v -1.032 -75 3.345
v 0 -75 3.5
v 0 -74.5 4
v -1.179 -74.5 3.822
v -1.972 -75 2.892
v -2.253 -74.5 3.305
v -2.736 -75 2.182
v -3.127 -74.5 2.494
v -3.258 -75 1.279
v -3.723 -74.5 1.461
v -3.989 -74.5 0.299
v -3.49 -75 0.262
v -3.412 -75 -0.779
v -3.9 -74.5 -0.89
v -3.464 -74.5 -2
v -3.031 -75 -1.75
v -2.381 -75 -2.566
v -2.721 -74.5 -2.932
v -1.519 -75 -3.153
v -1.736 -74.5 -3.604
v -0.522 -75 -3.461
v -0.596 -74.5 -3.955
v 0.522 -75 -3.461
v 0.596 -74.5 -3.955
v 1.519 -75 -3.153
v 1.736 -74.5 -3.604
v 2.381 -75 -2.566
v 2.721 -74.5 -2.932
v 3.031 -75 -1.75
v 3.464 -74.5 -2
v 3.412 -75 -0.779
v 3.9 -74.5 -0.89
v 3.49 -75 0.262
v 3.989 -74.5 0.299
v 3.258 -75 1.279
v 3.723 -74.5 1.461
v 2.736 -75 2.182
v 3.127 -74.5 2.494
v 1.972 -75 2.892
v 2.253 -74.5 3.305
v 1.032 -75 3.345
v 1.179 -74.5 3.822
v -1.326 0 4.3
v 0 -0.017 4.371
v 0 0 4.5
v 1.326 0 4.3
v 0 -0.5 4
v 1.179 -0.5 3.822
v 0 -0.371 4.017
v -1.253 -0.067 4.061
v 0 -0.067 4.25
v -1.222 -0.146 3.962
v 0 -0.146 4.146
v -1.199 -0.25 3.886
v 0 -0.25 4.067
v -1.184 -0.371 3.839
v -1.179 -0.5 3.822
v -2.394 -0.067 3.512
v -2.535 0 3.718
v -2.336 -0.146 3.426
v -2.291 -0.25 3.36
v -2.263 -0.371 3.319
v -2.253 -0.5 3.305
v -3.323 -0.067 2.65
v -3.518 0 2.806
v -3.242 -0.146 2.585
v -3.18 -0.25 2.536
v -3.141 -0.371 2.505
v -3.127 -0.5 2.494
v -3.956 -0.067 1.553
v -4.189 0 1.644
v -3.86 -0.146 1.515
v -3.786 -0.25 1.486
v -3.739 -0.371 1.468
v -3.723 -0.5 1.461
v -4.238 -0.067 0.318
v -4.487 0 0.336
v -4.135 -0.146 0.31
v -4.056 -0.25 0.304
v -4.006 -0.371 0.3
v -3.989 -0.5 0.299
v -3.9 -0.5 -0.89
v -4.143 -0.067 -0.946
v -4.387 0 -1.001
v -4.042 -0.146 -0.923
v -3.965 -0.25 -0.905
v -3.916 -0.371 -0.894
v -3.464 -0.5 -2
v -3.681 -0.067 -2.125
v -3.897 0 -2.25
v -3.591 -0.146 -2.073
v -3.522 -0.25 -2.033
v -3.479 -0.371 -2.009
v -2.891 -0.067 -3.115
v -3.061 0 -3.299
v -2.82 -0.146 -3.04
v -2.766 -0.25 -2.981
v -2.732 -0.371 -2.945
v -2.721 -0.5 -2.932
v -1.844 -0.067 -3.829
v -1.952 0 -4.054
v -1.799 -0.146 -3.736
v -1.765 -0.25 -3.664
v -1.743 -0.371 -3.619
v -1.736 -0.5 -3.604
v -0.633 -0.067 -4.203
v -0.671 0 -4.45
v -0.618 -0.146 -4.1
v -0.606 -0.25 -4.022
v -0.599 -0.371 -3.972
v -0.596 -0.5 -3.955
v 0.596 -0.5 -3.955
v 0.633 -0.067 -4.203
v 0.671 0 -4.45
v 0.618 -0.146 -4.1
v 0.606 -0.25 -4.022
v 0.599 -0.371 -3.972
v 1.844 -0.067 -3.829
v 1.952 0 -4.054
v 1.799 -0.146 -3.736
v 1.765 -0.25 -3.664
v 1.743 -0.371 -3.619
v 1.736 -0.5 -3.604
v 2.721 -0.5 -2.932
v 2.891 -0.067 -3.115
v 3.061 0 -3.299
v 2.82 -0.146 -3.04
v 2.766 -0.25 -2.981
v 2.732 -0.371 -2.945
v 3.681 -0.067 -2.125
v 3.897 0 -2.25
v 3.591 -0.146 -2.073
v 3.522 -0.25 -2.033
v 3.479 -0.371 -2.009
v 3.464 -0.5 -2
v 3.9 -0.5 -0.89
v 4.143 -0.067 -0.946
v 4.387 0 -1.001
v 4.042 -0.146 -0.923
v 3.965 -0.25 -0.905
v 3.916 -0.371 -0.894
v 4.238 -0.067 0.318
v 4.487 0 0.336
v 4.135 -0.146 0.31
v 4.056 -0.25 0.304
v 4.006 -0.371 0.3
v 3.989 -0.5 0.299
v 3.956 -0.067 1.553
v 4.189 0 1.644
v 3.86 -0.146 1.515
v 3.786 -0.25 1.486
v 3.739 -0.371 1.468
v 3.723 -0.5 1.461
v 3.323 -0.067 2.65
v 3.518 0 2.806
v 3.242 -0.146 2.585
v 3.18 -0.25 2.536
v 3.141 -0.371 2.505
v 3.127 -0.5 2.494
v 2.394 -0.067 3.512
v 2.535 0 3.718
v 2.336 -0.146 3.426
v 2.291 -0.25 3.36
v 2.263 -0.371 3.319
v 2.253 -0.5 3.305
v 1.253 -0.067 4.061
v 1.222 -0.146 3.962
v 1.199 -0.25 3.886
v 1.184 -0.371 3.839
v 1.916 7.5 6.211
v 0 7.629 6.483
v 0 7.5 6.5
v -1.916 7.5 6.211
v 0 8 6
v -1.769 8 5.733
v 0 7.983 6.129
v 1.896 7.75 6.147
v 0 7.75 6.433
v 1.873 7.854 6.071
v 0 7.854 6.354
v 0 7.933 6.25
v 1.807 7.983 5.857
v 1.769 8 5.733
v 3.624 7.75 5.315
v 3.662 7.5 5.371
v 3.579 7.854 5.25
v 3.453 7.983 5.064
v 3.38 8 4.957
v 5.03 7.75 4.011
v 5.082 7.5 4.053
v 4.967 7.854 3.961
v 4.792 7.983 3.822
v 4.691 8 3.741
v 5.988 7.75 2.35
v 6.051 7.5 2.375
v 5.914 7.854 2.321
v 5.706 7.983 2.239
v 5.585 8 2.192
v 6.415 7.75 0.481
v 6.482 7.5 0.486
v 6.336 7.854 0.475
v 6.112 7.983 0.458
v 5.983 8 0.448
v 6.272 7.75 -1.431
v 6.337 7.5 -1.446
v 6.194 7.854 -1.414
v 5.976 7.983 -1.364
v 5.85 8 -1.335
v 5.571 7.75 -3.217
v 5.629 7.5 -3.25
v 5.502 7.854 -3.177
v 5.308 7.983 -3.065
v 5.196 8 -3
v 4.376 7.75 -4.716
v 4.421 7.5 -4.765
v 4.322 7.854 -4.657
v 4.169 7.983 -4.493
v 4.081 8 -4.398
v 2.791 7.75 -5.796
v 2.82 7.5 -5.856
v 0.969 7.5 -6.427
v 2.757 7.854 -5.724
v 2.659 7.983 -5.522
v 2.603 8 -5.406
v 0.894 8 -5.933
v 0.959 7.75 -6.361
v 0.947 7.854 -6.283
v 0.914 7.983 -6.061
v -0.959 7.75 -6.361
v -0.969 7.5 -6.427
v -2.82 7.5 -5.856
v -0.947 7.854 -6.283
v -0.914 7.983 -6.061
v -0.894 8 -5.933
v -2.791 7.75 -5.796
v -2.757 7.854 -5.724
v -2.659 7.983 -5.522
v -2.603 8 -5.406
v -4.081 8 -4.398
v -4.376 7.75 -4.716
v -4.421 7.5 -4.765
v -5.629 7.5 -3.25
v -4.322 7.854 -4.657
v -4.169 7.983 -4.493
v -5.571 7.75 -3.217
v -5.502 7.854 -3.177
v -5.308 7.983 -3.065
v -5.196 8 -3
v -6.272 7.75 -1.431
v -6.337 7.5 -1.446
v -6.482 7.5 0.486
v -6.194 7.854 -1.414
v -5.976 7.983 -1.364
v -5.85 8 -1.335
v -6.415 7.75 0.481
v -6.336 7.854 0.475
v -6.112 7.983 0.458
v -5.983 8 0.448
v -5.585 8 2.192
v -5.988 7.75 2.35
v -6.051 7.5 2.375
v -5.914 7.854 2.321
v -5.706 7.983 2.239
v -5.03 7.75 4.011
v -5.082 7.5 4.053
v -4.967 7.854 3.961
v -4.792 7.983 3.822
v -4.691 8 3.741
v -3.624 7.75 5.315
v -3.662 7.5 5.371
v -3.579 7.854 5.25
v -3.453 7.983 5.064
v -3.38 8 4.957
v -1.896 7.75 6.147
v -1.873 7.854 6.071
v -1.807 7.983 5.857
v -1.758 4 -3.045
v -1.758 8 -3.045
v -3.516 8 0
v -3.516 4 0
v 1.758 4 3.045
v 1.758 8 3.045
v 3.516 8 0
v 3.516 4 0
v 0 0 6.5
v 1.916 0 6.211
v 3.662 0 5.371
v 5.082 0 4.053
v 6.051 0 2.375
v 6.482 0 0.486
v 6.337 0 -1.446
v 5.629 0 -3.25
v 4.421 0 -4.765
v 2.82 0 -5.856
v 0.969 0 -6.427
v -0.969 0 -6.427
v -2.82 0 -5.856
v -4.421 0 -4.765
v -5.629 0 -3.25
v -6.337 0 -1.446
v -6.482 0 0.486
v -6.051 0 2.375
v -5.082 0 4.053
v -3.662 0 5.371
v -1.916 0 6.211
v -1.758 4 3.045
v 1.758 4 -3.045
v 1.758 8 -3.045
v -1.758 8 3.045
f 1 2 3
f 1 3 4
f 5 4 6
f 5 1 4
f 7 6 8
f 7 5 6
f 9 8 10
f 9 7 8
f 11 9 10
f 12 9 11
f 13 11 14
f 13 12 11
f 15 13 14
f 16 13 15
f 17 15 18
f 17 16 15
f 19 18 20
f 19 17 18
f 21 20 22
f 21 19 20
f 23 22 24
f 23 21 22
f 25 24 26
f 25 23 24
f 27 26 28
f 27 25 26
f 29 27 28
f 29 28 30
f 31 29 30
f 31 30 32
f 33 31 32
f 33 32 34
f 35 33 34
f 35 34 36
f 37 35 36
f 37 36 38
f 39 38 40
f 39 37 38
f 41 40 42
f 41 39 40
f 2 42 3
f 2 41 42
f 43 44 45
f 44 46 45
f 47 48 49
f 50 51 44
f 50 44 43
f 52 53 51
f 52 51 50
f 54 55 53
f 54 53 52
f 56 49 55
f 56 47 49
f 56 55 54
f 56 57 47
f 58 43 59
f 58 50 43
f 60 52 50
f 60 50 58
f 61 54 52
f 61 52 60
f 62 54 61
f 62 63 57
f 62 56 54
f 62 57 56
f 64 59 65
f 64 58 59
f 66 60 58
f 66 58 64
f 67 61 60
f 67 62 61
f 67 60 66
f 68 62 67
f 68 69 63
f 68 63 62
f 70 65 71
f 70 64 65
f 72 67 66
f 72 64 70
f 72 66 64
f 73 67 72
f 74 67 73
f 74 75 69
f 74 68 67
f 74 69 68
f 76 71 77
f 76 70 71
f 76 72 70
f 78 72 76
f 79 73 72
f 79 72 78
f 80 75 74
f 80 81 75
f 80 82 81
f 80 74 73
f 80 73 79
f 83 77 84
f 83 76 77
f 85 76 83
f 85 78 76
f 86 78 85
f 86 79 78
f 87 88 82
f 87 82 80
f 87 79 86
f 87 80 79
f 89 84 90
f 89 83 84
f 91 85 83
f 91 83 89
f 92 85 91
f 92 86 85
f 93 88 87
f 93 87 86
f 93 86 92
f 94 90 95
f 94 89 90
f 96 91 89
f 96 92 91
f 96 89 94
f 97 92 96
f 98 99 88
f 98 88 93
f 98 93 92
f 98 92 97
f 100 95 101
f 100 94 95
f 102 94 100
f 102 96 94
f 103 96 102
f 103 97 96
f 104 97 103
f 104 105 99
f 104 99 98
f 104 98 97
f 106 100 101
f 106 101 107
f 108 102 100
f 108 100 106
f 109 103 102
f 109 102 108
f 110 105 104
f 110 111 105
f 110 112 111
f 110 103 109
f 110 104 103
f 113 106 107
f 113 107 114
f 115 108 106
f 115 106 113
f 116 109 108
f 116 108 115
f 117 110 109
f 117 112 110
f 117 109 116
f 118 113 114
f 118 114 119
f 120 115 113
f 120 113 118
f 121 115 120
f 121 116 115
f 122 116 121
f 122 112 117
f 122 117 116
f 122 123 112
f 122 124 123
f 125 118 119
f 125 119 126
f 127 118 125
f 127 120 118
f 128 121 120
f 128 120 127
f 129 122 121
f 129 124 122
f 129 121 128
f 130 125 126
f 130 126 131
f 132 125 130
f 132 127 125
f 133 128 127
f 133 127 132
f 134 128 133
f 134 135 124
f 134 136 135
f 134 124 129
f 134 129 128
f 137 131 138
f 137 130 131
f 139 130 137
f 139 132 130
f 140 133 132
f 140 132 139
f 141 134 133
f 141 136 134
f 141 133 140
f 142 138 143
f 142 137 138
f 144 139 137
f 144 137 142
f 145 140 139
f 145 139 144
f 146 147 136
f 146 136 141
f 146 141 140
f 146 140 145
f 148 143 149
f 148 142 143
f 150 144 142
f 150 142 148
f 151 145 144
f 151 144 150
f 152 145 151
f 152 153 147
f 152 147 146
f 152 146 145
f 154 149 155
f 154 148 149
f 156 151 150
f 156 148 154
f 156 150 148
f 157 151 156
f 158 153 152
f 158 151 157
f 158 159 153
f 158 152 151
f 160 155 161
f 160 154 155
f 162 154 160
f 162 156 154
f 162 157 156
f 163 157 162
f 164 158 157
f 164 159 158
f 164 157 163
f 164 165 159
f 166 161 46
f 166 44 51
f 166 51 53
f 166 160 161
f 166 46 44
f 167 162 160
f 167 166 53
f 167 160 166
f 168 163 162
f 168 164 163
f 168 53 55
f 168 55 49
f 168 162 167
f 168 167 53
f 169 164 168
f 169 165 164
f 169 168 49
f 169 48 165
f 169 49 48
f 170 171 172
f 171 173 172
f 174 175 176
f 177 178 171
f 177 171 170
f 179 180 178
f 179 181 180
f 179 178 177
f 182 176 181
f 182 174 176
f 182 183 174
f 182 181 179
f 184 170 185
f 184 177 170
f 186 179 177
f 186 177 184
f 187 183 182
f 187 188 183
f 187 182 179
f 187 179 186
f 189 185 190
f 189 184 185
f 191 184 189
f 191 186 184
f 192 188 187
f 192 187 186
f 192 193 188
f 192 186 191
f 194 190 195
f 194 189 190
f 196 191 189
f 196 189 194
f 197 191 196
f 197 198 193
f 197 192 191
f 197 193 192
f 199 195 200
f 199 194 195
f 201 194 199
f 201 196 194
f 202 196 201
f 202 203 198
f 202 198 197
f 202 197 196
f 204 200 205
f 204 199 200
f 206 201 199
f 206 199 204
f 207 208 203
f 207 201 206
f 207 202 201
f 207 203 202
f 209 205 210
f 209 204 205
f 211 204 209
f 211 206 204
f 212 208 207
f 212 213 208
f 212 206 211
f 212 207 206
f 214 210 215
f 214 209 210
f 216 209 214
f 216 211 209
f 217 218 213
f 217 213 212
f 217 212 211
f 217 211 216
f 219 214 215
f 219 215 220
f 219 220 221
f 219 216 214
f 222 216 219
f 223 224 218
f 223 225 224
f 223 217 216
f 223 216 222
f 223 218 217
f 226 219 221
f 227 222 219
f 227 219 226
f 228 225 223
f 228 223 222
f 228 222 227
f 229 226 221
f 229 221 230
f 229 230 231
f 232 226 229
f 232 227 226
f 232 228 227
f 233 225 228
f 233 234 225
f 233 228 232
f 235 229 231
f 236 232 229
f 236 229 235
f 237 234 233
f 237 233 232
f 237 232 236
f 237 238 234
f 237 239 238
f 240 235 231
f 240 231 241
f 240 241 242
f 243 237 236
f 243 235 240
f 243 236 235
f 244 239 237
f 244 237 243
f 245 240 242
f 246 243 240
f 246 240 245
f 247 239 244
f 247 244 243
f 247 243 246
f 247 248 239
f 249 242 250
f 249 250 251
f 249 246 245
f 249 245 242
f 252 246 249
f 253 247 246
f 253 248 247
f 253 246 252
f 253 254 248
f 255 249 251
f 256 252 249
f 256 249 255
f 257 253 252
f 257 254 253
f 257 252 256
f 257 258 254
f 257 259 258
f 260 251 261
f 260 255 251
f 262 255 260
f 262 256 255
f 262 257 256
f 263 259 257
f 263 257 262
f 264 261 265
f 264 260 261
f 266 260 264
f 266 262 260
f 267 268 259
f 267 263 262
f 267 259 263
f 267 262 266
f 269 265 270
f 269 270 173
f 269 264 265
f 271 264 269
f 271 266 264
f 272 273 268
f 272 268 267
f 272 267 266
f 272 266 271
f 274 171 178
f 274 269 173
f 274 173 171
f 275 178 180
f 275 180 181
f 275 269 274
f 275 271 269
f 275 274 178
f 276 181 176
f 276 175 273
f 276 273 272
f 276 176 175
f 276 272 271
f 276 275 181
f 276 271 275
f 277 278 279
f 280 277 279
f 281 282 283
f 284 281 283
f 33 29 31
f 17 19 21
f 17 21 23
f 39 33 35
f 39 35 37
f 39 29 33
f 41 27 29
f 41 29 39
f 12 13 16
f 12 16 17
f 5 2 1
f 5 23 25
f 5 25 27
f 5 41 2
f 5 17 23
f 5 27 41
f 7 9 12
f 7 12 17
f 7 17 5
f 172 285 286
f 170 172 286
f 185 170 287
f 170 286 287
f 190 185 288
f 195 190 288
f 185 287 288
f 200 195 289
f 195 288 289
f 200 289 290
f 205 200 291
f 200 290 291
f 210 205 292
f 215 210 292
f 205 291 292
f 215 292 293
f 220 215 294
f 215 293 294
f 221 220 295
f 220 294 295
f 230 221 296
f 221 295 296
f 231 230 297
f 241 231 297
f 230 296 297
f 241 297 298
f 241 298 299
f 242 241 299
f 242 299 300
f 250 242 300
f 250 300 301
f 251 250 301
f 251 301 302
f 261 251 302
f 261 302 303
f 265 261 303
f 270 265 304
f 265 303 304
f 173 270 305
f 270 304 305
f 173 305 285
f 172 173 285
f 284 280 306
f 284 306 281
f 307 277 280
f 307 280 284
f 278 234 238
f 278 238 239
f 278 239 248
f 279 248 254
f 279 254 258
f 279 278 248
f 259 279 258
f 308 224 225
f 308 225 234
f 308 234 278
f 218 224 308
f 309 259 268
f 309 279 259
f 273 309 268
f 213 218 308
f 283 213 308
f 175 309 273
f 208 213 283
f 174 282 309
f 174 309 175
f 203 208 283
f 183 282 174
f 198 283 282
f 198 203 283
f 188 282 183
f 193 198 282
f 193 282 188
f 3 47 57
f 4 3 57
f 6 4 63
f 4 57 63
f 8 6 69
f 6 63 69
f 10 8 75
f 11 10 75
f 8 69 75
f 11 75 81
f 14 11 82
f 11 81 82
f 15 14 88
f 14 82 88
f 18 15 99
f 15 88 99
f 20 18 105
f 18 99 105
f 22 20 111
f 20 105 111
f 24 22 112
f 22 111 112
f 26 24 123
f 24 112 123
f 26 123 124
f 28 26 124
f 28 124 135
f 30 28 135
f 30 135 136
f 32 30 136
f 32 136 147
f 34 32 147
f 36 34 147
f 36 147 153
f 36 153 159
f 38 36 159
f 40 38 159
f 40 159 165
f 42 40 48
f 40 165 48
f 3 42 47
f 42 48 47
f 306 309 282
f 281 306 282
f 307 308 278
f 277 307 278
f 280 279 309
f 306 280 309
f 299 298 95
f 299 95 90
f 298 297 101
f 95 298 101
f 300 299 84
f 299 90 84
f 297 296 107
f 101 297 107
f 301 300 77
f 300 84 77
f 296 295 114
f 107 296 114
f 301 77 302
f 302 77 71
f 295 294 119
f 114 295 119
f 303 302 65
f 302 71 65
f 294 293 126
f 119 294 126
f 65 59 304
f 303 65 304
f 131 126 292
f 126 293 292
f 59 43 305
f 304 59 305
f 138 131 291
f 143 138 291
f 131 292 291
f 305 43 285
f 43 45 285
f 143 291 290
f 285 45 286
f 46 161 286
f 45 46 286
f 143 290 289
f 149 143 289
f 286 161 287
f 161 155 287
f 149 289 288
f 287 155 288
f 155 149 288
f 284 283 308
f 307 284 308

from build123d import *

# Parameters (mm, degrees)
SKETCH_1_R          = 6.5
EXTRUDE_1_DEPTH     = 8
CUT_EXTRUDE_1_DEPTH = 4
FILLET_1_R          = 0.5
SKETCH_3_R          = 4
EXTRUDE_2_DEPTH     = 75
FILLET_2_R          = 0.5
CHAMFER_1_SIZE      = 0.5


with BuildPart() as part:
    # ｽｹｯﾁ1 → ﾎﾞｽ - 押し出し1 (new body)
    with BuildSketch(Plane(origin=(0, 0, 0), x_dir=(1, 0, 0), z_dir=(0, 1, 0))):
        with Locations(Location((0, 0, 0), (0, 0, 270))):
            Circle(SKETCH_1_R)
    extrude(amount=EXTRUDE_1_DEPTH)

    # ｽｹｯﾁ2 → ｶｯﾄ - 押し出し1 (cut)
    with BuildSketch(Plane(origin=(0, 8, 0), x_dir=(1, 0, 0), z_dir=(0, 1, 0))):
        Polygon((3.516063139, 0), (1.75803157, 3.045), (-1.75803157, 3.045), (-3.516063139, 0), (-1.75803157, -3.045), (1.75803157, -3.045), align=None)
    extrude(amount=-CUT_EXTRUDE_1_DEPTH, mode=Mode.SUBTRACT)

    # ﾌｨﾚｯﾄ1
    fillet_1_edges = [part.edges().sort_by_distance(p)[0] for p in [
        (0, 8, -6.5),
    ]]
    fillet(fillet_1_edges, radius=FILLET_1_R)

    # ｽｹｯﾁ3 → ﾎﾞｽ - 押し出し2 (add)
    with BuildSketch(Plane.XZ):
        with Locations(Location((0, 0, 0), (0, 0, 90))):
            Circle(SKETCH_3_R)
    extrude(amount=EXTRUDE_2_DEPTH)

    # ﾌｨﾚｯﾄ2
    fillet_2_edges = [part.edges().sort_by_distance(p)[0] for p in [
        (0, 0, -4),
    ]]
    fillet(fillet_2_edges, radius=FILLET_2_R)

    # 面取り1
    chamfer_1_edges = [part.edges().sort_by_distance(p)[0] for p in [
        (0, -75, -4),
    ]]
    chamfer(chamfer_1_edges, length=CHAMFER_1_SIZE)


solid = part.part
